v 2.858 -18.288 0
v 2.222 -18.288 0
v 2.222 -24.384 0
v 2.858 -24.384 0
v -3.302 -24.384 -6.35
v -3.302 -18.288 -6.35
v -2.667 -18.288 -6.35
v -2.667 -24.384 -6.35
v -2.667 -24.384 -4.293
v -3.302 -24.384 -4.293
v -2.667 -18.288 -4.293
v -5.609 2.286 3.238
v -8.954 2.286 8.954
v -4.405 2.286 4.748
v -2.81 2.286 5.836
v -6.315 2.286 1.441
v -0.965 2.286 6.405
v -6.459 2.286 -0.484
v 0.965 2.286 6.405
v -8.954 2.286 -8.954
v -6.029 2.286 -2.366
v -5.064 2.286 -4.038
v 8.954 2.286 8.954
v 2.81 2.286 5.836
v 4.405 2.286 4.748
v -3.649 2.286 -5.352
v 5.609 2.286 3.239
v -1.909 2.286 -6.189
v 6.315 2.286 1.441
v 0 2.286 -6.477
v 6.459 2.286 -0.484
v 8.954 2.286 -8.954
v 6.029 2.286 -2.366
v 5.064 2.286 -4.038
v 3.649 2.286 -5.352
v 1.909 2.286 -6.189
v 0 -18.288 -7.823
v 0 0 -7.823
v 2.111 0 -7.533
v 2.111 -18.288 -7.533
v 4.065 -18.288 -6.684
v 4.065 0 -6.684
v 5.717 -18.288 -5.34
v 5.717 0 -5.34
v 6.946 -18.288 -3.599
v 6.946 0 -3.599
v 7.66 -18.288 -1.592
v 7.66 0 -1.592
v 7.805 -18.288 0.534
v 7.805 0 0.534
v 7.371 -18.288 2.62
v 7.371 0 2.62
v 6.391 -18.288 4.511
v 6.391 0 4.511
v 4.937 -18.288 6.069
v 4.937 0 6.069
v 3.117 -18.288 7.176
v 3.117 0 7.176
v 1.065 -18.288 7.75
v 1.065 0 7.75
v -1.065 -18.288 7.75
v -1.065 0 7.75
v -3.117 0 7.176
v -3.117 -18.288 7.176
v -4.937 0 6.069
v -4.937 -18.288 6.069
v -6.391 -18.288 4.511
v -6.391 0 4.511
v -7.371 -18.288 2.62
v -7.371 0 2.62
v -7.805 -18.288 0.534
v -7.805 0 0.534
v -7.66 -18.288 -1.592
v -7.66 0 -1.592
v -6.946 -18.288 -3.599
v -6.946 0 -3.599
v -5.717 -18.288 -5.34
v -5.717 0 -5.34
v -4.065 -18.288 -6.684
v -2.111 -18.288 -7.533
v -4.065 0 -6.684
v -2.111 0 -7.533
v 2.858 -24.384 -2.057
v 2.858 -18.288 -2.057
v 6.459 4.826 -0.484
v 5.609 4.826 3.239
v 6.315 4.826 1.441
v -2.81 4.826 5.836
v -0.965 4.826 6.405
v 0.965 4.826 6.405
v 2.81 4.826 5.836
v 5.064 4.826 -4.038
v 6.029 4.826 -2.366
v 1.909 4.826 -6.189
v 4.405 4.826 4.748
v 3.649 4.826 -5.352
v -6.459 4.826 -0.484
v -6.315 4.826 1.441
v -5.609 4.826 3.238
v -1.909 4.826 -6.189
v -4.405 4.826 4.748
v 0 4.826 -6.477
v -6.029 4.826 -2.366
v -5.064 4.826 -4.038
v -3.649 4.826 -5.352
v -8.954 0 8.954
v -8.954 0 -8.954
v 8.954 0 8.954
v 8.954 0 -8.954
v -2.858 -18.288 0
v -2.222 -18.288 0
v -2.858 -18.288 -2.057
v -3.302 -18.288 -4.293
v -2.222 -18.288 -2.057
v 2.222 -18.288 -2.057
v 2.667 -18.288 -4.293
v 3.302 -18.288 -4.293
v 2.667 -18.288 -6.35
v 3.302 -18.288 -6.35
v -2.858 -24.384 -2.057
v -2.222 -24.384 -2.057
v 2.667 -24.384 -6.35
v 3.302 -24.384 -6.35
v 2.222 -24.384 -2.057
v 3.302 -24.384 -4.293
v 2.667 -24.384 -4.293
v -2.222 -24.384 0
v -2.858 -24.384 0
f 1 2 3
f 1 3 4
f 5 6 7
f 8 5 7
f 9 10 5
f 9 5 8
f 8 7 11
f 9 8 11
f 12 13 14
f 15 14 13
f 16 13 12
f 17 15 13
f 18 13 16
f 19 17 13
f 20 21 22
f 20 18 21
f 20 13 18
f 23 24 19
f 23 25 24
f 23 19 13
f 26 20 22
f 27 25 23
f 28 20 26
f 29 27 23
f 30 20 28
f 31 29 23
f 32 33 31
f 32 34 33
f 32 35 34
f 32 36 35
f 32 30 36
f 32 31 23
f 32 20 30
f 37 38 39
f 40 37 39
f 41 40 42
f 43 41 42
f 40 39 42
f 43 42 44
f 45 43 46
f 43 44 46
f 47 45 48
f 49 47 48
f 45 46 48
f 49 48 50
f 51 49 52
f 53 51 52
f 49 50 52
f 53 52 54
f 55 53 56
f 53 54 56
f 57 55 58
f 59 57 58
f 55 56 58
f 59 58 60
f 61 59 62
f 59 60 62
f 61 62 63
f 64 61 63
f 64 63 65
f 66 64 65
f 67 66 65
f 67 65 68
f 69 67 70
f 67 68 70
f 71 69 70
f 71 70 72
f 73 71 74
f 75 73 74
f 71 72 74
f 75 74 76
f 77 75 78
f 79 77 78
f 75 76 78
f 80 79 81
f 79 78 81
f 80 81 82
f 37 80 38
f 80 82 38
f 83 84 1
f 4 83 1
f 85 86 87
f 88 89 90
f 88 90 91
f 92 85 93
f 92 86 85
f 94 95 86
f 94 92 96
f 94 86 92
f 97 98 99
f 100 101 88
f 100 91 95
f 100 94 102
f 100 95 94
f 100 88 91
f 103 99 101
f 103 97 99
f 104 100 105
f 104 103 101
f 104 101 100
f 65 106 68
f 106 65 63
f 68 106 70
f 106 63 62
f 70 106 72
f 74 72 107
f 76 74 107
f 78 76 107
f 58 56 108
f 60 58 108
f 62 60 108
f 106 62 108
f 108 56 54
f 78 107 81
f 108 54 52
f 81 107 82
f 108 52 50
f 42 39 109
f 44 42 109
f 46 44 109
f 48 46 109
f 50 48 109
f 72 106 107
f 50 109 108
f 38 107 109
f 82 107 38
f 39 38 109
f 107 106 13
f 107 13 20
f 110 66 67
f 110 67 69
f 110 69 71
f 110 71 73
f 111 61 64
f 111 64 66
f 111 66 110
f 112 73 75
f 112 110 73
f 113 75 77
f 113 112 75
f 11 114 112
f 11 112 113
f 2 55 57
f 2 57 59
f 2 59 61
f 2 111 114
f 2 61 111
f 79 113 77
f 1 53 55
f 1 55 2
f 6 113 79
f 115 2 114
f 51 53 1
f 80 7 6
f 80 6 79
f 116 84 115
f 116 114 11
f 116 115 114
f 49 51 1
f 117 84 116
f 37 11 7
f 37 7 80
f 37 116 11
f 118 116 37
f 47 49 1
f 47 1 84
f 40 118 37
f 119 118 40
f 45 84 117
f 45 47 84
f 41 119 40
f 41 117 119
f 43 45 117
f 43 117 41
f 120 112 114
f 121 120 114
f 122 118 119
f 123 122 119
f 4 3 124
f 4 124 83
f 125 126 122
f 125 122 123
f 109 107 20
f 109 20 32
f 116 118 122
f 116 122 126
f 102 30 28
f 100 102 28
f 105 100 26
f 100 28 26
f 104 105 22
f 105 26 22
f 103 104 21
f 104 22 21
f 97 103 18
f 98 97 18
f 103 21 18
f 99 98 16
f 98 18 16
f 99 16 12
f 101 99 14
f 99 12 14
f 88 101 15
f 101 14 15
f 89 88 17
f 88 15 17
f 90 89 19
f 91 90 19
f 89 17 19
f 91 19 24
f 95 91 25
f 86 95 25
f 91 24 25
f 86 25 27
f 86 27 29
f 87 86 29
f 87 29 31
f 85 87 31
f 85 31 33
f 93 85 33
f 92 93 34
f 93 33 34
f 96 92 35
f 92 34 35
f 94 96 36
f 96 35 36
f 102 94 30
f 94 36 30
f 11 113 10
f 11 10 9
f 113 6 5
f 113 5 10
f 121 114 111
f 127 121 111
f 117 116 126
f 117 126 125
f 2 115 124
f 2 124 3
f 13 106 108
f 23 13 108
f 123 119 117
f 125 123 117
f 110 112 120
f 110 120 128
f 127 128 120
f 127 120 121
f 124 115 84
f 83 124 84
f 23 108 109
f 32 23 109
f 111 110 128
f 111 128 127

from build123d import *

# Parameters (mm, degrees)
SKETCH1_W           = 17.907
SKETCH1_H           = 17.907
BOSS_EXTRUDE1_DEPTH = 2.286
SKETCH2_R           = 6.477
BOSS_EXTRUDE2_DEPTH = 2.54
SKETCH3_R           = 7.8232
BOSS_EXTRUDE3_DEPTH = 18.288
SKETCH4_W           = 0.635
SKETCH4_H           = 2.0574
BOSS_EXTRUDE4_DEPTH = 6.096


with BuildPart() as part:
    # Sketch1 → Boss-Extrude1 (new body)
    with BuildSketch(Plane(origin=(0, 0, 0), x_dir=(1, 0, 0), z_dir=(0, 1, 0))):
        Rectangle(SKETCH1_W, SKETCH1_H)
    extrude(amount=BOSS_EXTRUDE1_DEPTH)

    # Sketch2 → Boss-Extrude2 (add)
    with BuildSketch(Plane(origin=(0, 2.286, 0), x_dir=(1, 0, 0), z_dir=(0, 1, 0))):
        with Locations(Location((0, 0, 0), (0, 0, 90))):  # turned: the seam where the file's is
            Circle(SKETCH2_R)
    extrude(amount=BOSS_EXTRUDE2_DEPTH)

    # Sketch3 → Boss-Extrude3 (add)
    with BuildSketch(Plane.XZ):
        with Locations(Location((0, 0, 0), (0, 0, 270))):  # turned: the seam where the file's is
            Circle(SKETCH3_R)
    extrude(amount=BOSS_EXTRUDE3_DEPTH)

    # Sketch4 → Boss-Extrude4 (add)
    with BuildSketch(Plane.XZ.offset(18.288)):
        with Locations((-2.54, -1.0287)):
            Rectangle(SKETCH4_W, SKETCH4_H)
        with Locations((2.54, -1.0287)):
            Rectangle(SKETCH4_W, SKETCH4_H)
        with Locations((-2.9845, -5.3213)):
            Rectangle(SKETCH4_W, SKETCH4_H)
        with Locations((2.9845, -5.3213)):
            Rectangle(SKETCH4_W, SKETCH4_H)
    extrude(amount=BOSS_EXTRUDE4_DEPTH)


solid = part.part
